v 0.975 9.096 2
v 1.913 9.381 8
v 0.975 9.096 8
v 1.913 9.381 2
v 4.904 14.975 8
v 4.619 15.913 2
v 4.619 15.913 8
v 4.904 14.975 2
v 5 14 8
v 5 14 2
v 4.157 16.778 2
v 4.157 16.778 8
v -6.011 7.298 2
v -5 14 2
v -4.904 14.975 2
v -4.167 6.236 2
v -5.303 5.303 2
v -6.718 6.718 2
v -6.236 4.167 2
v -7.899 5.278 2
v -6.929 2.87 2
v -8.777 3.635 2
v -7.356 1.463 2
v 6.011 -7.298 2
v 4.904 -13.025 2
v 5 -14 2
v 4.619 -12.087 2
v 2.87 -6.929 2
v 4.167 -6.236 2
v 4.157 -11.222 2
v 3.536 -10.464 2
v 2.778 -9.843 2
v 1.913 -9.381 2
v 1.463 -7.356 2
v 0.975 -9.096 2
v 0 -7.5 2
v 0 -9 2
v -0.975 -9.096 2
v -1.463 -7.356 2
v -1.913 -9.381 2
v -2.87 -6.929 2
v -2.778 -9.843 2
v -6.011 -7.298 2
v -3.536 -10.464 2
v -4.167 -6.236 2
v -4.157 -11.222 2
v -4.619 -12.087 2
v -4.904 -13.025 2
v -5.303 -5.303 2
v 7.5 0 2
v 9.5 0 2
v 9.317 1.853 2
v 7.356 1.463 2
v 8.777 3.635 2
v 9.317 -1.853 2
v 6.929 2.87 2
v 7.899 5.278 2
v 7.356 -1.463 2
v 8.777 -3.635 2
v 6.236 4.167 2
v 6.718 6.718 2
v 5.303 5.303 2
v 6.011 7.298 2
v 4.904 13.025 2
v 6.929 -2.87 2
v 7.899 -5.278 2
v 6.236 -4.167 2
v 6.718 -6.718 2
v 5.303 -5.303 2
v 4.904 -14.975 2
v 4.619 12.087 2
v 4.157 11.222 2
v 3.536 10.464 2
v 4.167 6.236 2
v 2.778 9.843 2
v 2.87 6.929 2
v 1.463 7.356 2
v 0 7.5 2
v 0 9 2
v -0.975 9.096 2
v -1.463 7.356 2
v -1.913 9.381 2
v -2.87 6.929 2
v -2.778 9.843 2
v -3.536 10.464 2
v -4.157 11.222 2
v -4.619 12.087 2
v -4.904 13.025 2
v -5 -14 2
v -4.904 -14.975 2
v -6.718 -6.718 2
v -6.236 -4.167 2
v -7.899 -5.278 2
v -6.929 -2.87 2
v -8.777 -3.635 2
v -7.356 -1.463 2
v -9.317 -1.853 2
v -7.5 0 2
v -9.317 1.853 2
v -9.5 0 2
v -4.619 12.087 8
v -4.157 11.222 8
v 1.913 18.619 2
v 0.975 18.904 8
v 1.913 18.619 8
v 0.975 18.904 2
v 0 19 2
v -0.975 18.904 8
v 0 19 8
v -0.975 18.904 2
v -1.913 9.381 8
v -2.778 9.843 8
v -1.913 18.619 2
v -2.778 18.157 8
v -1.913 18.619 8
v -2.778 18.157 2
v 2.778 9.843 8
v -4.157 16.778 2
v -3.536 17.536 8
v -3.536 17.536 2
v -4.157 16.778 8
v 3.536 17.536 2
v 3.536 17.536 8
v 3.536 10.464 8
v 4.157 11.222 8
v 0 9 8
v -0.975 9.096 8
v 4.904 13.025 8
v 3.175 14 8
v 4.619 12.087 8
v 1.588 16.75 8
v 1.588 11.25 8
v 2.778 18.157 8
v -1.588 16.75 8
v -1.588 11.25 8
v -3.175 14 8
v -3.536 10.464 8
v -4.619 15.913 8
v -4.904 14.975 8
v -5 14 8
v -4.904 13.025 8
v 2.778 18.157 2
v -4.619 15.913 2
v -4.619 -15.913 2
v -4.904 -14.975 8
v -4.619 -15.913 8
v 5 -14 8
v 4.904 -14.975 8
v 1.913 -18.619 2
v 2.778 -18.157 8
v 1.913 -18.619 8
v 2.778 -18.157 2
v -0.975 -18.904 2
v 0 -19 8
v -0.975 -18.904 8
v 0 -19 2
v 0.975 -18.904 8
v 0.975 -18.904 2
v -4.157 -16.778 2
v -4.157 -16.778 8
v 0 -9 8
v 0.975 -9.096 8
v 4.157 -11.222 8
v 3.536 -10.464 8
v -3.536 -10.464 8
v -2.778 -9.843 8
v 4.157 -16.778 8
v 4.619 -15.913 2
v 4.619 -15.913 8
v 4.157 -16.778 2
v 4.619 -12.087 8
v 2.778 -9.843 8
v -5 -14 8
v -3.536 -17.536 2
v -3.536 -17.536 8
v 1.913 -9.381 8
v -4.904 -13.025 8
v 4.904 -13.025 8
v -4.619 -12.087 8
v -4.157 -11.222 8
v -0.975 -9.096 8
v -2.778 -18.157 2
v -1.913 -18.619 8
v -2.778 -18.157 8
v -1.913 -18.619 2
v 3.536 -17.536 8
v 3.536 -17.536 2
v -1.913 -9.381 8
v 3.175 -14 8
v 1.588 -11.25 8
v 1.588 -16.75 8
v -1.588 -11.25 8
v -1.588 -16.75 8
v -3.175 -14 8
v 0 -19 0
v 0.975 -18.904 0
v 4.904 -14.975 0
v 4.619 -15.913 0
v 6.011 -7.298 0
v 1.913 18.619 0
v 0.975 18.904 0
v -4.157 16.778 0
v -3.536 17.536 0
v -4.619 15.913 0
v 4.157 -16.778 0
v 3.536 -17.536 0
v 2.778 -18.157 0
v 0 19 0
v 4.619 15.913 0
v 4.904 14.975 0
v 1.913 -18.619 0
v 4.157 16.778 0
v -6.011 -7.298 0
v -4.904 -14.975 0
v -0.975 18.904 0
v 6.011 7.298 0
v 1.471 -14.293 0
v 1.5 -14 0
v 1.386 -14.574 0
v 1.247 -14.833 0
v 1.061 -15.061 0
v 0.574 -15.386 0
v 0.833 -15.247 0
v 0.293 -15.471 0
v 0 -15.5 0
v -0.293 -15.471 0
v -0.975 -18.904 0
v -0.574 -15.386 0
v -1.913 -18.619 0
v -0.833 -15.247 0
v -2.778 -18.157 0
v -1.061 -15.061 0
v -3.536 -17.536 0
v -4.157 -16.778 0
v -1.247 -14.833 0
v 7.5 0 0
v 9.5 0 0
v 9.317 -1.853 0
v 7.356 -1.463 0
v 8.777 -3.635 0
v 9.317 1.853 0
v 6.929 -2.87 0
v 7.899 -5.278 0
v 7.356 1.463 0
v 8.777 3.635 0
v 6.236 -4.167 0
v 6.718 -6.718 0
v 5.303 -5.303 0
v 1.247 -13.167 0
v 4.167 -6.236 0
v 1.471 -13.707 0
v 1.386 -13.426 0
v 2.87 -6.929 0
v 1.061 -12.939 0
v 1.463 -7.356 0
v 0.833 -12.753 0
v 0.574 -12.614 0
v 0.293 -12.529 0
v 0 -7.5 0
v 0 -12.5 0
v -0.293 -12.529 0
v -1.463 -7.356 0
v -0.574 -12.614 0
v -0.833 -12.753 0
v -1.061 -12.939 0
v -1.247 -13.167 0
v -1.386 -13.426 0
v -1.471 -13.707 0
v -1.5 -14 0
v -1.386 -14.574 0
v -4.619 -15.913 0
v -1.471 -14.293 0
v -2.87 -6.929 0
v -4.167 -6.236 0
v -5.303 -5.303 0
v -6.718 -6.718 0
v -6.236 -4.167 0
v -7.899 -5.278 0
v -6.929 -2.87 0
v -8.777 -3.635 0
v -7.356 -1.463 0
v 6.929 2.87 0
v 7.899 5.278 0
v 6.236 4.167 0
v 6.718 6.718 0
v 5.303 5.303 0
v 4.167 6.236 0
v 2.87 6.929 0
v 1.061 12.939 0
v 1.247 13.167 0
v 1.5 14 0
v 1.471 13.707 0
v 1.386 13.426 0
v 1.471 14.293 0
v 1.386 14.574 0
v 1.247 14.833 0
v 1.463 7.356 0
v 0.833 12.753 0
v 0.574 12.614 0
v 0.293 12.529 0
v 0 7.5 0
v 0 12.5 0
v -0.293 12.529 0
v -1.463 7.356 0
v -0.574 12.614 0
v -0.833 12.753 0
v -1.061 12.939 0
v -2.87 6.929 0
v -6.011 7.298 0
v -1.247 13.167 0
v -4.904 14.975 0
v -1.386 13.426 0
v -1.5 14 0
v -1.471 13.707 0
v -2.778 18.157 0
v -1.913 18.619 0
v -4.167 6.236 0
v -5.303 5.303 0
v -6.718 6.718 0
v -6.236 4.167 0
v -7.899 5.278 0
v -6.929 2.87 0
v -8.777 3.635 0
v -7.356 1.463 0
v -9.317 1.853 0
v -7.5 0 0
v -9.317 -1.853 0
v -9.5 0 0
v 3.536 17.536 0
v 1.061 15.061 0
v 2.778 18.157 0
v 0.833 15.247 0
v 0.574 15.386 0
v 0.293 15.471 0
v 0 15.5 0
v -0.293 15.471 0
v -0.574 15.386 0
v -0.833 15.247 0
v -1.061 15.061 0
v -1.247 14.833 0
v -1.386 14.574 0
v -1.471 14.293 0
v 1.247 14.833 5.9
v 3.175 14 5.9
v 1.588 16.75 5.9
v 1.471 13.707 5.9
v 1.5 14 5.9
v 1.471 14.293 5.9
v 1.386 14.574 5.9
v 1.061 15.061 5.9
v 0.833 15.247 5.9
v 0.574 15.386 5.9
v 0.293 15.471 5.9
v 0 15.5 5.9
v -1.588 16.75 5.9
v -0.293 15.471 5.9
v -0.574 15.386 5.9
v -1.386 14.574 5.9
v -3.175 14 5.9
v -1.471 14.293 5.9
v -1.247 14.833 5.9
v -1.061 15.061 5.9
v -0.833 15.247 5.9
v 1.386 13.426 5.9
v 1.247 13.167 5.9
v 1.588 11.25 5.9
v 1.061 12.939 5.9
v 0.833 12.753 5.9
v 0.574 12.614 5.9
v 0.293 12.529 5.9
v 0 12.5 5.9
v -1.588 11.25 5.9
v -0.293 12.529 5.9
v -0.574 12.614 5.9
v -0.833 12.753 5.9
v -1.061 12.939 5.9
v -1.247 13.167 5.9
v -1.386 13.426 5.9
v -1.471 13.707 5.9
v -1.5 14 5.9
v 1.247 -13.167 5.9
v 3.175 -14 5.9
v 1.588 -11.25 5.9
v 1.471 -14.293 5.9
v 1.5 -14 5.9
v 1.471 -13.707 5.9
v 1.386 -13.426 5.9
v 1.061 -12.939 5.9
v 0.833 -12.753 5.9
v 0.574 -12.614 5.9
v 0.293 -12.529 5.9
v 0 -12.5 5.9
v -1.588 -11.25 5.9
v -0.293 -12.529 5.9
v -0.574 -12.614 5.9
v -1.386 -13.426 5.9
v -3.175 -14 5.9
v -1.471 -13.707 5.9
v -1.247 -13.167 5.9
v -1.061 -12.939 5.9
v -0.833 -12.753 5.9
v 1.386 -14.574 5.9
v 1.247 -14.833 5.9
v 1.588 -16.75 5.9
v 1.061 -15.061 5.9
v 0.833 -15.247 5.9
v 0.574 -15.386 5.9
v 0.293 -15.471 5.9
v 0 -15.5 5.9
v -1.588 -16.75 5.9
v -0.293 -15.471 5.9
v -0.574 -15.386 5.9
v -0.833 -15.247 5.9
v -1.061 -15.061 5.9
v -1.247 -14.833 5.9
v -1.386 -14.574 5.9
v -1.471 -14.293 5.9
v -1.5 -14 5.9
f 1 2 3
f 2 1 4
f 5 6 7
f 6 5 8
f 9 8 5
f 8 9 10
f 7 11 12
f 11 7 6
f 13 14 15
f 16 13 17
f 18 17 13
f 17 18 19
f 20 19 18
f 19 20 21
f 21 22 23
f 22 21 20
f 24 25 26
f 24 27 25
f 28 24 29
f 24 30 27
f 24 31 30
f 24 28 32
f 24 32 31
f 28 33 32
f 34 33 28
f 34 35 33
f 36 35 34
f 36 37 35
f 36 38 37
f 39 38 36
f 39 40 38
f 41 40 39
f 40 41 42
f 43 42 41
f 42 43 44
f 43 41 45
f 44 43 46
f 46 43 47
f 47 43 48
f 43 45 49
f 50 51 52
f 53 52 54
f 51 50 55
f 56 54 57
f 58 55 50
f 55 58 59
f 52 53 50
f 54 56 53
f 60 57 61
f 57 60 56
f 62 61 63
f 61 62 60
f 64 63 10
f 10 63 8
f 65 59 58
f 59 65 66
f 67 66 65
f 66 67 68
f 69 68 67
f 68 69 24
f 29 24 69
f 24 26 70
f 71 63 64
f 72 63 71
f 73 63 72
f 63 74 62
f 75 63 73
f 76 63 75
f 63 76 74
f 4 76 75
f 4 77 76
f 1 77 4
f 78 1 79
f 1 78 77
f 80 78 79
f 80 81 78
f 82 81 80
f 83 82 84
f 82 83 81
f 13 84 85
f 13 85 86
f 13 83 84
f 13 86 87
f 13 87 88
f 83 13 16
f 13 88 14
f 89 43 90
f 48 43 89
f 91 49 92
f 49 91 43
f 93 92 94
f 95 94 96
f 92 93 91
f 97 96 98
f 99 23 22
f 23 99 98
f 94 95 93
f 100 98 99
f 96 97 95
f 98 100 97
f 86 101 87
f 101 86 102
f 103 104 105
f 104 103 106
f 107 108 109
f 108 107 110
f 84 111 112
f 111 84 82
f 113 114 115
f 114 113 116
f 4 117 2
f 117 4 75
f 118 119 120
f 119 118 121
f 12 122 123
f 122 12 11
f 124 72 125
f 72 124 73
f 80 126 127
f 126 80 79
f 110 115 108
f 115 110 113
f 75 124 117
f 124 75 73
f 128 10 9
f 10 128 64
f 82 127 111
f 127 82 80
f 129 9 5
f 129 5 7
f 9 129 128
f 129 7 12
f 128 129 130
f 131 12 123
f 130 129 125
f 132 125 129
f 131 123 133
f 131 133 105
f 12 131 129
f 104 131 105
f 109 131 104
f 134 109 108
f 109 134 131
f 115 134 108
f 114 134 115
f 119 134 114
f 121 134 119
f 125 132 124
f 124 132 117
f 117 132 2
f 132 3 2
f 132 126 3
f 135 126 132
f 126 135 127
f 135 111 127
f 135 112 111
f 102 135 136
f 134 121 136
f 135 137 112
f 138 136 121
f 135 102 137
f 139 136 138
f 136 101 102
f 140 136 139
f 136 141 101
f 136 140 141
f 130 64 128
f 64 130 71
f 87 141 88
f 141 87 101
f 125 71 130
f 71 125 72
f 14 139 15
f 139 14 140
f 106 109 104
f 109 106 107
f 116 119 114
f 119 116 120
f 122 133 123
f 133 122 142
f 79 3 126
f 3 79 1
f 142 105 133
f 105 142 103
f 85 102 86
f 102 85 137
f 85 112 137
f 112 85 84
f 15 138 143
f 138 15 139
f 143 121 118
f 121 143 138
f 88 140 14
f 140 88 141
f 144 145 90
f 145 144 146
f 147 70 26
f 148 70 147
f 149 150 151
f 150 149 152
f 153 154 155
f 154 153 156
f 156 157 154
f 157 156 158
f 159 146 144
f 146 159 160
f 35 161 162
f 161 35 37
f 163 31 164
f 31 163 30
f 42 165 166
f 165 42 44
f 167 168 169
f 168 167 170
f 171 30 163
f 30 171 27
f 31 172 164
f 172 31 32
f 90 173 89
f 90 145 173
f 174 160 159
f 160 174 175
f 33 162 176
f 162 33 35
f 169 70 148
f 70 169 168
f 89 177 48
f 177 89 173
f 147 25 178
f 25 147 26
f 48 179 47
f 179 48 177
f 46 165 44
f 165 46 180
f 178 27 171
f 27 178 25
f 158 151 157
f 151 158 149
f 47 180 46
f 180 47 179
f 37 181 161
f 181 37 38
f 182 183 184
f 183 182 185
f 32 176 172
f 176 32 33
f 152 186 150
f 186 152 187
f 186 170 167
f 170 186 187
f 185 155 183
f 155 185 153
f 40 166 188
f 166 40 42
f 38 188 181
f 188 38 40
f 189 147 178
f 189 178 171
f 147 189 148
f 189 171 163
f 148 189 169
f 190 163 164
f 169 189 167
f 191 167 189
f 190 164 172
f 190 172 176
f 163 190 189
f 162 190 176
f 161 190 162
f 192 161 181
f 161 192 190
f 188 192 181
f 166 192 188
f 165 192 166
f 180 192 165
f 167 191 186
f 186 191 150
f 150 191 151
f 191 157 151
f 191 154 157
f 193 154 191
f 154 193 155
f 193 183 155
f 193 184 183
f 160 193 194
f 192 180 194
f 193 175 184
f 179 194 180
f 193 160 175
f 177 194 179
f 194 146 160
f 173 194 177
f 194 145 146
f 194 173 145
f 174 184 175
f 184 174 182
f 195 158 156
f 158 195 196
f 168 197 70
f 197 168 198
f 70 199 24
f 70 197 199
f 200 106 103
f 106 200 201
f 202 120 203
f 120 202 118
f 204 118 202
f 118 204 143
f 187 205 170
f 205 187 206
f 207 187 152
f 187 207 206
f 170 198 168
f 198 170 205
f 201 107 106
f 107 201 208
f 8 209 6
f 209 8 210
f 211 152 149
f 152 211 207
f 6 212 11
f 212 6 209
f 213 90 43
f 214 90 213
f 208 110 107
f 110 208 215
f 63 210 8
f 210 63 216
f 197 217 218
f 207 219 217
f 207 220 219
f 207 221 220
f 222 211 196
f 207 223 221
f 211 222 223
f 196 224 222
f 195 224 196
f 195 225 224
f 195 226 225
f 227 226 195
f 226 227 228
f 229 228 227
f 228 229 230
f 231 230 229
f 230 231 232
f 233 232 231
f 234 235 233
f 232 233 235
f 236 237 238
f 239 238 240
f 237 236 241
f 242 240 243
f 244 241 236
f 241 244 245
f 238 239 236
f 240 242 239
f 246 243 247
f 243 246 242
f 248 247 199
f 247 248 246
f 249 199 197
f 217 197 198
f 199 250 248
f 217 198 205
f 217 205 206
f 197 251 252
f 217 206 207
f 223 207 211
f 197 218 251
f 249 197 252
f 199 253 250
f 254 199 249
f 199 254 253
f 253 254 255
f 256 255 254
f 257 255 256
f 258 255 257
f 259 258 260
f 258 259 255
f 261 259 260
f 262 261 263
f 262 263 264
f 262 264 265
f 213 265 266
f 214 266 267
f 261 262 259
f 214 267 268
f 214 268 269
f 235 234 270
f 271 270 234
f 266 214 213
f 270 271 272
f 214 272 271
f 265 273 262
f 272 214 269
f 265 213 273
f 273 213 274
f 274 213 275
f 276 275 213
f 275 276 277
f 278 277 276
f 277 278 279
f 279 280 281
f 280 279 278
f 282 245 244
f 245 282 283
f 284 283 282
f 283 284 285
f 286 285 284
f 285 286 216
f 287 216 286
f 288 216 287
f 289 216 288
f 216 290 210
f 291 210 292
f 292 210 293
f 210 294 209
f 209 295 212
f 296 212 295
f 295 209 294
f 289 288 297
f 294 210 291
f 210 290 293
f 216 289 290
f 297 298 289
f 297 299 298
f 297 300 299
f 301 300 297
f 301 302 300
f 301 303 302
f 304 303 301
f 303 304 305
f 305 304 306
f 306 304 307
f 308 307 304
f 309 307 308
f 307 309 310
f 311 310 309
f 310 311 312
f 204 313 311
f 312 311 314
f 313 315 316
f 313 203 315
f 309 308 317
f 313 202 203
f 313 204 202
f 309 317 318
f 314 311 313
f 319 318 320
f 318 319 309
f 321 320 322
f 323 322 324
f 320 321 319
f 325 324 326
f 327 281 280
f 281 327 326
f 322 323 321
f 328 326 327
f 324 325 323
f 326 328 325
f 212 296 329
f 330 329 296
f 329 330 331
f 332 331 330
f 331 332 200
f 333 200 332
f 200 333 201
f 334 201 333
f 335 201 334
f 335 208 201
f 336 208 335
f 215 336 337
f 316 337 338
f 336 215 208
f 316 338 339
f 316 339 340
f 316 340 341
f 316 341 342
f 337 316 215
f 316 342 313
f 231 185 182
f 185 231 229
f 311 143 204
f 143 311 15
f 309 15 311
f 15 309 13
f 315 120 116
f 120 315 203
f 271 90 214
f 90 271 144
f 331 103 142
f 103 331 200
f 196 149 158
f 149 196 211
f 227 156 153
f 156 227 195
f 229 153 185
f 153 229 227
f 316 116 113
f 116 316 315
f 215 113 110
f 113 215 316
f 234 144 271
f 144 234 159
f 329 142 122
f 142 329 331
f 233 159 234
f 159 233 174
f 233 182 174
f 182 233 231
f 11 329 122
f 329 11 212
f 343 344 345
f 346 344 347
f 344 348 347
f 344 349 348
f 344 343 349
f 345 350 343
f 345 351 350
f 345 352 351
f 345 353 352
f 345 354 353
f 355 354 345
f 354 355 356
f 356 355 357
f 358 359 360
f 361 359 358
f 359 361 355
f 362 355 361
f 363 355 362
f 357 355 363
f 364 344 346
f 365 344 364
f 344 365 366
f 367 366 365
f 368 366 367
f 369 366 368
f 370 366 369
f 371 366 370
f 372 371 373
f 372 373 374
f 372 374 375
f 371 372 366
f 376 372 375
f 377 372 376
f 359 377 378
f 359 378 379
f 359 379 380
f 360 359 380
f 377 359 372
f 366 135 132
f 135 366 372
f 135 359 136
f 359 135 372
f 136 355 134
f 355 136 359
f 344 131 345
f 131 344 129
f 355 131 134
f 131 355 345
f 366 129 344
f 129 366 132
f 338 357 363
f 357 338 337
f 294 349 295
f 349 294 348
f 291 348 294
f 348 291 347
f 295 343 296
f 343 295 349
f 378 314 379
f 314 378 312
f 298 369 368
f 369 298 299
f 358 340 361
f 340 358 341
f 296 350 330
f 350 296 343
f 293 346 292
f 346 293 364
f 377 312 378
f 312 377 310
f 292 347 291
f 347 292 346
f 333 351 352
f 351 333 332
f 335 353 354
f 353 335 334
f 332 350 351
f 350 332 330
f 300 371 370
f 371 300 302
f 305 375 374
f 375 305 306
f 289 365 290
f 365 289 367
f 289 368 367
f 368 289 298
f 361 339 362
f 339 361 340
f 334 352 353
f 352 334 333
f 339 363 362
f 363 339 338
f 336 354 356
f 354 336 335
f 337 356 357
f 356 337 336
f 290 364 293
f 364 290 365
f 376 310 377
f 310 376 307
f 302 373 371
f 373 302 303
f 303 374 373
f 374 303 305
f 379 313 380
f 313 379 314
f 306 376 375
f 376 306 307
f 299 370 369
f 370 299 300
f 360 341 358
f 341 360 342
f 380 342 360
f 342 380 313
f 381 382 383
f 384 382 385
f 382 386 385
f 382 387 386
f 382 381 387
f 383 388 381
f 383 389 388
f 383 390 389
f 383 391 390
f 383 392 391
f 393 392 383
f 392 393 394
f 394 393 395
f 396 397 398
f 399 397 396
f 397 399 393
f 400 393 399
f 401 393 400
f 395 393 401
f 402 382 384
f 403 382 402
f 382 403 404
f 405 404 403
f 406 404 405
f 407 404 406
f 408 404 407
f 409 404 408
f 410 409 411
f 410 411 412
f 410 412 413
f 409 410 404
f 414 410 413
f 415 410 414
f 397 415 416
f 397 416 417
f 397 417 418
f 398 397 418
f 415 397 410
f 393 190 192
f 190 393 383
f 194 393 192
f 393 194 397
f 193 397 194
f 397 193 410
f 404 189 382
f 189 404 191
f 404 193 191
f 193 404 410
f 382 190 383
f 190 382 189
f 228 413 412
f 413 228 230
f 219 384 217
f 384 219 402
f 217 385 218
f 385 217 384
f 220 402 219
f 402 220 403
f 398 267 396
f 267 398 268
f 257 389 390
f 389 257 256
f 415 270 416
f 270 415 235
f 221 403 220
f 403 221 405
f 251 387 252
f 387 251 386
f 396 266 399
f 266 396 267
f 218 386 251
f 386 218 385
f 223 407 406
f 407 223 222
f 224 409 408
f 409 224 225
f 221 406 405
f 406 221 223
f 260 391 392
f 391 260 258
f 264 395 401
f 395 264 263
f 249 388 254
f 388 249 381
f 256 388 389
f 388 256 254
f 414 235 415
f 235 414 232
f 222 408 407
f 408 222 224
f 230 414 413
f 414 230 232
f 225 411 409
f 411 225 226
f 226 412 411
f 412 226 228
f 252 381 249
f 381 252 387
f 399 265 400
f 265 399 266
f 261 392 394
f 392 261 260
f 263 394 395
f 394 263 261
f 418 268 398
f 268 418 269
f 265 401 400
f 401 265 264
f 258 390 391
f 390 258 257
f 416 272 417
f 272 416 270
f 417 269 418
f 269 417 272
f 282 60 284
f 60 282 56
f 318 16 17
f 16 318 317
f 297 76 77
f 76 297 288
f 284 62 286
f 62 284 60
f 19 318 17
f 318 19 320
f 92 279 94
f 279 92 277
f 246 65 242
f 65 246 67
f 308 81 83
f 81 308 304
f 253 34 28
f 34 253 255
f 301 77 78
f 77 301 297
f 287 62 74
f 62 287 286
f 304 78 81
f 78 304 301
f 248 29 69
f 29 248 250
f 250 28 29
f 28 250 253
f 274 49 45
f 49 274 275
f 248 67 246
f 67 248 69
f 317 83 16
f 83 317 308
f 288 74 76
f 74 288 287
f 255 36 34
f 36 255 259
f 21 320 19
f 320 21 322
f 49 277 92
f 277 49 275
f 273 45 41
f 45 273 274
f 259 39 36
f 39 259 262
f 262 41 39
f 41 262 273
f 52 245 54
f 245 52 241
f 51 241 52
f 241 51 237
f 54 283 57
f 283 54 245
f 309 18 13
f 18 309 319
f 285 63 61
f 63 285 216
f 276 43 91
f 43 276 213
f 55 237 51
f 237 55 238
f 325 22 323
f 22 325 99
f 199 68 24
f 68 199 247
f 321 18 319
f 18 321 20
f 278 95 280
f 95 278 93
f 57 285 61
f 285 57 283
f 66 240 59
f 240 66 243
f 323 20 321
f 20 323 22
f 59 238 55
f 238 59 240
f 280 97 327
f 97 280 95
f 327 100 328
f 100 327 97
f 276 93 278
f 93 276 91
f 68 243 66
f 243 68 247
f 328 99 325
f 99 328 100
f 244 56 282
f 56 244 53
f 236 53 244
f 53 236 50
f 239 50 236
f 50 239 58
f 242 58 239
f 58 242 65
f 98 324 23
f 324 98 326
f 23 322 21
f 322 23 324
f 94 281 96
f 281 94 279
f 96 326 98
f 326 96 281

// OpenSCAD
// file: generic/ball_caster_support.scad
include <lib.scad>;

use <ball_caster_yoke.scad>;

function pvBallCasterSupportDatasheet(ball_diameter, ball_protrusion, ball_gap,
                                      wall_gap, wall_thickness, base_thickness,
                                      mount_offset, mount_diameter) =
     assert(ball_diameter > 0)
     assert(ball_protrusion > 0)
     assert(ball_diameter > ball_protrusion)
     assert(ball_gap > 0)
     assert(wall_gap > 0)
     assert(ball_diameter > 2 * wall_gap)
     assert(wall_thickness > 0)
     assert(base_thickness > 0)
     assert(mount_offset > ball_diameter/2)
     assert(mount_diameter > 0)
     [["ball_diameter", ball_diameter], ["ball_protrusion", ball_protrusion], ["ball_gap", ball_gap],
      ["wall_gap", wall_gap], ["wall_thickness", wall_thickness], ["base_thickness", base_thickness],
      ["mount_offset", mount_offset], ["mount_diameter", mount_diameter],
      ["ball_z_offset", base_thickness + ball_gap + ball_diameter / 2],
      ["main_height", base_thickness + ball_gap + ball_diameter - ball_protrusion],
      ["main_diameter", ball_diameter + 2 * wall_thickness]];

module pmBallCasterSupport(datasheet) {
     base_thickness = property(datasheet, "base_thickness");
     main_height = property(datasheet, "main_height");
     main_diameter = property(datasheet, "main_diameter");
     mount_offset = property(datasheet, "mount_offset");
     mount_diameter = property(datasheet, "mount_diameter");
     ball_diameter = property(datasheet, "ball_diameter");
     ball_protrusion = property(datasheet, "ball_protrusion");
     ball_gap = property(datasheet, "ball_gap");
     ball_z_offset = property(datasheet, "ball_z_offset");
     wall_gap = property(datasheet, "wall_gap");
     wall_thickness = property(datasheet, "wall_thickness");

     pmBallCasterYoke(datasheet);
     rotate([0, 0, 90]) {
          translate([0, 0, base_thickness]) {
               difference() {
                    cylinder(h=main_height - base_thickness, d=main_diameter);
                    translate([0, 0, ball_z_offset - base_thickness]) sphere(d=ball_diameter);
                    translate([-main_diameter / 2 - kEpsilon, -wall_gap / 2, 0]) {
                         cube([main_diameter + 2 * kEpsilon, wall_gap, main_height - base_thickness + kEpsilon]);
                    }
                    translate([-main_diameter/2 - kEpsilon, 0, main_height - base_thickness - wall_gap/2]) {
                         rotate([0, 90, 0]) cylinder(h=main_diameter + 2 * kEpsilon, d=2 * wall_gap, $fn=6);
                    }
                    cylinder(h=ball_diameter/4 + ball_gap, d=ball_diameter * sqrt(3)/2);
               }
          }
     }
}

pmBallCasterSupport(
     datasheet=pvBallCasterSupportDatasheet(
          ball_diameter=10, ball_protrusion=3, ball_gap=2,
          wall_gap=3, wall_thickness=2, base_thickness=2,
          mount_offset=10, mount_diameter=4
     )
);
// file: oem/generic/standoffs.scad
include <lib.scad>;

use <third_party/threads.scad>;

function pvMetricHexStandoffDatasheet(length, width, hole_diameter=0, thread_pitch=0) =
     assert(length > 0)
     assert(width > 0)
     assert(hole_diameter >= 0)
     assert(width > hole_diameter)
     assert(thread_pitch >= 0)
     [["length", length], ["width", width], ["hole_diameter", hole_diameter], ["thread_pitch", thread_pitch]];


module pmMetricHexStandoff(datasheet) {
     width = property(datasheet, "width");
     length = property(datasheet, "length");
     hole_diameter = property(datasheet, "hole_diameter");
     thread_pitch = property(datasheet, "thread_pitch");
     difference() {
          cylinder(d=width / cos(30), h=length, $fn=6);
          translate([0, 0, -length/2]) {
               if (hole_diameter > 0) {
                    if (thread_pitch > 0) {
                         metric_thread(diameter=hole_diameter, pitch=thread_pitch,
                                       length=2 * length, internal=true);
                    } else {
                         cylinder(d=hole_diameter, h=2 * length);
                    }
               }
          }
     }
}

pmMetricHexStandoff(
     datasheet=pvMetricHexStandoffDatasheet(
          length=20, width=5, hole_diameter=3, thread_pitch=1
     )
);
// file: oem/generic/lib.scad
$fn = 32;

kEpsilon = 1e-1;

function property(table, key) = table[search([key], table)[0]][1];

module sector(radius, angles, fn = $fn) {
     r = radius / cos(180 / fn);
     step = -360 / fn;

     points = concat([[0, 0]],
                     [for(a = [angles[0] : step : angles[1] - 360])
                               [r * cos(a), r * sin(a)]
                          ],
                     [[r * cos(angles[1]), r * sin(angles[1])]]
          );

     difference() {
          circle(radius, $fn = fn);
          polygon(points);
     }
}

module ring(inner_radius, outer_radius, angles = [0, 360], fn = $fn) {
     difference() {
          sector(radius=outer_radius, angles=angles, fn=fn);
          sector(radius=inner_radius, angles=angles+[-kEpsilon, kEpsilon], fn=fn);
     }
}

module rounded_ring(inner_radius, outer_radius, angles = [0, 360], fn = $fn) {
     step_angle = 360 / fn;
     ring_width = outer_radius - inner_radius;
     ring_mean_radius = (outer_radius + inner_radius) / 2;
     for (theta = angles) {
          theta_d = theta / step_angle;
          theta_frac = (theta_d - floor(theta_d) - 0.5) * step_angle;
          rho = ring_mean_radius * cos(step_angle/2) / cos(theta_frac);
          rotate(theta)
          translate([rho, 0])
          circle(d=ring_width);
     }
     ring(inner_radius=inner_radius,
          outer_radius=outer_radius,
          angles=angles, fn=fn);
}

module fillet(r) {
     difference() {
          difference() {
               offset(r=-r - kEpsilon)
                    offset(delta=r) {
                    children();
               }
               offset(r=r)
                    offset(delta=-r) {
                    children();
               }
          }
          children();
     }
     offset(r=r)
          offset(delta=-r) {
          children();
     }
}

module bench_fillet(r, order=1000) {
     difference() {
          fillet(r) {
               translate([-order/2-kEpsilon, 0]) {
                    square([order, order], center=true);
               }
               children();
          }
          translate([-order/2-kEpsilon, 0]) {
               square([order+kEpsilon, order+kEpsilon], center=true);
          }
     }
}

module curved_bench_fillet(r, bench_radius, order=1000, internal=true) {
     difference() {
          fillet(r) {
               if (internal) {
                    translate([bench_radius, 0]) {
                         ring(inner_radius=bench_radius + kEpsilon, outer_radius=bench_radius * order);
                    }
               } else {
                    translate([-bench_radius, 0]) circle(r=bench_radius - kEpsilon);
               }
               children();
          }
          if (internal) {
               translate([bench_radius, 0]) {
                    ring(inner_radius=bench_radius,
                         outer_radius=bench_radius * order - kEpsilon);
               }
          } else {
               translate([-bench_radius, 0]) circle(r=bench_radius);
          }

     }
}


module window(side, position=[0, 0, 0], order=1000) {
    difference() {
        children();
        translate(position)  {
            difference() {
                square(order, center=true);
                square(side, center=true);
            }
        }
    }
}


module rounded_cylinder(diameter, height, fillet_radius, center) {
     translate([0, 0, ! center ? height/2 : 0]) {
          minkowski() {
               cylinder(d=(diameter - 2 * fillet_radius),
                        h=(height - 2 * fillet_radius),
                        center=true);
               sphere(r=fillet_radius);
          }
     }
}


module curved_support_xsection(support_radius, fillet_radius,
                               wall_inner_radius, wall_outer_radius,
                               hole_radius = 0, internal=true) {
     support_angular_width = (4 * support_radius / wall_outer_radius) * 180 / PI;
     wall_thickness = wall_outer_radius - wall_inner_radius;
     rotate([0, 0, internal ? 180 : 0]) {
          difference() {
               window(6*support_radius) {
                    curved_bench_fillet(fillet_radius, bench_radius=wall_inner_radius, internal=internal) {
                         hull() {
                              translate([support_radius + wall_thickness/2, 0]) {
                                   circle(r=support_radius);
                              }
                              rotate([0, 0, ! internal ? 180 : 0])
                              translate([wall_inner_radius + wall_thickness/2, 0]) {
                                   ring(inner_radius=wall_inner_radius,
                                        outer_radius=wall_outer_radius,
                                        angles=[180 - support_angular_width/2,
                                                180 + support_angular_width/2]);
                              }
                         }
                         rotate([0, 0, ! internal ? 180 : 0])
                         translate([wall_inner_radius + wall_thickness/2, 0]) {
                              ring(inner_radius=wall_inner_radius,
                                   outer_radius=wall_outer_radius,
                                   angles=[180 - support_angular_width,
                                           180 + support_angular_width]);
                         }
                    }
               }
               if (hole_radius > 0) {
                    translate([support_radius + wall_thickness/2, 0]) {
                         circle(r=hole_radius);
                    }
               }
          }
     }
}

module fill(upto=1000) {
     offset(delta=-upto) {
          offset(delta=upto) {
               children();
          }
     }
}

module outline(delta) {
     if (delta > 0) {
          difference() {
               offset(delta=delta) {
                    children();
               }
               children();
          }
     } else {
          difference() {
               children();
               offset(delta=delta) {
                    children();
               }
          }
     }
}

module duplicate(v) {
     children();
     mirror(v) children();
}

function steps(start, end, n) = [start:(end - start)/(n - 1):end];

function sigmoid(x) = 1.0 / (1.0 + exp(-x));

module sigmoid_profile(length, width, order=10, fn = $fn) {
     step = length / fn;
     points = concat(
          [[0, 0]],
          [for (x = [step:step:length-step]) [x, width * sigmoid(2 * order * ((x / length) - 0.5))]],
          [[length, width], [0, width]]

     );
     polygon(points=points);
}

module exp_nerve_xsection(height, length, decay_rate = 5, fn = $fn) {
     step = length / fn;
     points = concat(
          [[0, 0]],
          [for (x = [0:step:length-step]) [x, height * exp(-x/decay_rate)]],
          [[length, 0]]
          );
     polygon(points=points);
}

module exp_nerve(height, length, thickness, decay_rate = 3, fn = $fn) {
     rotate([90, 0, 0])
     linear_extrude(height=thickness, center=true) {
          exp_nerve_xsection(height, length, decay_rate, fn);
     }
}

module exp_corner_nerve(height, radius, angles, corner_radius = 0, decay_rate = 3, fn = $fn) {
     difference() {
          rotate_extrude() {
               if (corner_radius > 0) {
                    translate([corner_radius, 0, 0])
                    exp_nerve_xsection(height=height, length=radius, decay_rate=decay_rate, fn=fn);
               } else {
                    translate([-corner_radius, 0, 0])
                    mirror([1, 0, 0])
                    exp_nerve_xsection(height=height, length=radius, decay_rate=decay_rate, fn=fn);
               }
          }
          linear_extrude(height=2 * height, center=true) {
               sector(radius=radius + abs(corner_radius), angles=[angles[1], angles[0] + 360], fn=fn);
          }
     }
}
// file: 10mm_ball_caster_support.scad
include <generic/lib.scad>;

use <generic/ball_caster_support.scad>;

use <oem/m3_hex_standoff.scad>;

function v10mmBallCasterSupportDatasheet() =
     pvBallCasterSupportDatasheet(ball_diameter=10, ball_protrusion=3, ball_gap=1,
                                  wall_gap=2, wall_thickness=2, base_thickness=2,
                                  mount_offset=14, mount_diameter=10);

module m10mmBallCasterSupport() {
     datasheet = v10mmBallCasterSupportDatasheet();
     base_thickness = property(datasheet, "base_thickness");
     mount_offset = property(datasheet, "mount_offset");
     difference() {
          pmBallCasterSupport(datasheet);
          translate([0, 0, -kEpsilon]) {
               duplicate([0, 1, 0]) {
                    translate([0, mount_offset, 0]) {
                         linear_extrude(height=base_thickness + 2 * kEpsilon) {
                              hull() projection() mM3x15mmHexStandoff();
                         }
                    }
               }
               let(hole_diameter=property(vM3x15mmHexStandoffDatasheet(), "hole_diameter")) {
                    cylinder(h=base_thickness + 2 * kEpsilon, d=hole_diameter);
               }
          }
     }
}

m10mmBallCasterSupport();
// file: oem/m3_hex_standoff.scad
include <generic/lib.scad>;

use <generic/standoffs.scad>;

function vM3x30mmHexThreadedStandoffDatasheet() =
     pvMetricHexStandoffDatasheet(hole_diameter=3, thread_pitch=0.5, length=30, width=5.5);

module mM3x30mmHexThreadedStandoff() {
     pmMetricHexStandoff(datasheet=vM3x30mmHexThreadedStandoffDatasheet());
}

function vM3x30mmHexStandoffDatasheet() =
     pvMetricHexStandoffDatasheet(hole_diameter=3, length=30, width=5.5);

module mM3x30mmHexStandoff() {
     pmMetricHexStandoff(datasheet=vM3x30mmHexStandoffDatasheet());
}


function vM3x40mmHexThreadedStandoffDatasheet() =
     pvMetricHexStandoffDatasheet(hole_diameter=3, thread_pitch=0.5, length=40, width=5.5);

module mM3x40mmHexThreadedStandoff() {
     pmMetricHexStandoff(datasheet=vM3x40mmHexThreadedStandoffDatasheet());
}

function vM3x40mmHexStandoffDatasheet() =
     pvMetricHexStandoffDatasheet(hole_diameter=3, length=40, width=5.5);

module mM3x40mmHexStandoff() {
     pmMetricHexStandoff(datasheet=vM3x40mmHexStandoffDatasheet());
}


function vM3x15mmHexThreadedStandoffDatasheet() =
     pvMetricHexStandoffDatasheet(hole_diameter=3, thread_pitch=0.5, length=15, width=5.5);

module mM3x15mmHexThreadedStandoff() {
     pmMetricHexStandoff(datasheet=vM3x15mmHexThreadedStandoffDatasheet());
}

function vM3x15mmHexStandoffDatasheet() =
     pvMetricHexStandoffDatasheet(hole_diameter=3, length=15, width=5.5);

module mM3x15mmHexStandoff() {
     pmMetricHexStandoff(datasheet=vM3x15mmHexStandoffDatasheet());
}
// file: generic/ball_caster_yoke.scad
include <lib.scad>;

function pvBallCasterYokeDatasheet(main_diameter, base_thickness, mount_offset, mount_diameter, mount_height=0) =
     assert(main_diameter > 0)
     assert(base_thickness > 0)
     assert(mount_offset > 0)
     assert(mount_diameter > 0)
     [["main_diameter", main_diameter], ["base_thickness", base_thickness],
      ["mount_offset", mount_offset], ["mount_diameter", mount_diameter],
      ["mount_height", mount_height]];

module pmBallCasterYoke(datasheet) {
     main_diameter = property(datasheet, "main_diameter");
     base_thickness = property(datasheet, "base_thickness");
     mount_offset = property(datasheet, "mount_offset");
     mount_diameter = property(datasheet, "mount_diameter");
     mount_height = property(datasheet, "mount_height");

     linear_extrude(height=base_thickness) {
          hull() {
               circle(d=main_diameter);
               duplicate([0, 1, 0]) {
                    translate([0, mount_offset, 0]) {
                         circle(d=mount_diameter);
                    }
               }
          }
     }
     if (mount_height > 0) {
          translate([0, 0, base_thickness]) {
               duplicate([0, 1, 0]) {
                    translate([0, mount_offset, 0]) {
                         cylinder(h=mount_height, d=mount_diameter);
                    }
               }
          }
     }
}

pmBallCasterYoke(
     datasheet=pvBallCasterYokeDatasheet(
          main_diameter=12, base_thickness=2, mount_offset=10, mount_diameter=4, mount_height=5
     )
);
// main file
include <generic/lib.scad>;

use <generic/ball_caster_yoke.scad>;
use <oem/m3_hex_standoff.scad>;

use <10mm_ball_caster_support.scad>;

function v10mmBallCasterBaseDatasheet() =
     let(support_datasheet=v10mmBallCasterSupportDatasheet(),
         base_thickness=property(support_datasheet, "base_thickness"),
         main_height=property(support_datasheet, "main_height"))
     concat(
          pvBallCasterYokeDatasheet(main_diameter=property(support_datasheet, "main_diameter"),
                                    base_thickness=base_thickness,
                                    mount_offset=property(support_datasheet, "mount_offset"),
                                    mount_diameter=property(support_datasheet, "mount_diameter"),
                                    mount_height=main_height - 2 * base_thickness),
          [["support_opening_diameter", property(support_datasheet, "main_diameter") + 1]]
     );


module m10mmBallCasterBase() {
     datasheet = v10mmBallCasterBaseDatasheet();
     base_thickness = property(datasheet, "base_thickness");
     mount_offset = property(datasheet, "mount_offset");
     mount_height = property(datasheet, "mount_height");

     support_opening_diameter = property(datasheet, "support_opening_diameter");

     difference() {
          pmBallCasterYoke(datasheet);
          translate([0, 0, -kEpsilon]) {
               duplicate([0, 1, 0]) {
                    translate([0, mount_offset, 0]) {
                         translate([0, 0, mount_height]) {
                              linear_extrude(height=base_thickness + 2 * kEpsilon) {
                                   hull() projection() mM3x15mmHexStandoff();
                              }
                         }
                         let(hole_diameter=property(vM3x15mmHexStandoffDatasheet(), "hole_diameter")) {
                              cylinder(h=mount_height + base_thickness + 2 * kEpsilon, d=hole_diameter);
                         }
                    }
               }
               cylinder(d=support_opening_diameter, h=base_thickness + 2 * kEpsilon);
          }
     }
     difference() {
          cylinder(d=support_opening_diameter + 2 * base_thickness, h=base_thickness);
          translate([0, 0, -kEpsilon]) {
               cylinder(d=support_opening_diameter, h=base_thickness + 2 * kEpsilon);
          }
     }
}

m10mmBallCasterBase();
